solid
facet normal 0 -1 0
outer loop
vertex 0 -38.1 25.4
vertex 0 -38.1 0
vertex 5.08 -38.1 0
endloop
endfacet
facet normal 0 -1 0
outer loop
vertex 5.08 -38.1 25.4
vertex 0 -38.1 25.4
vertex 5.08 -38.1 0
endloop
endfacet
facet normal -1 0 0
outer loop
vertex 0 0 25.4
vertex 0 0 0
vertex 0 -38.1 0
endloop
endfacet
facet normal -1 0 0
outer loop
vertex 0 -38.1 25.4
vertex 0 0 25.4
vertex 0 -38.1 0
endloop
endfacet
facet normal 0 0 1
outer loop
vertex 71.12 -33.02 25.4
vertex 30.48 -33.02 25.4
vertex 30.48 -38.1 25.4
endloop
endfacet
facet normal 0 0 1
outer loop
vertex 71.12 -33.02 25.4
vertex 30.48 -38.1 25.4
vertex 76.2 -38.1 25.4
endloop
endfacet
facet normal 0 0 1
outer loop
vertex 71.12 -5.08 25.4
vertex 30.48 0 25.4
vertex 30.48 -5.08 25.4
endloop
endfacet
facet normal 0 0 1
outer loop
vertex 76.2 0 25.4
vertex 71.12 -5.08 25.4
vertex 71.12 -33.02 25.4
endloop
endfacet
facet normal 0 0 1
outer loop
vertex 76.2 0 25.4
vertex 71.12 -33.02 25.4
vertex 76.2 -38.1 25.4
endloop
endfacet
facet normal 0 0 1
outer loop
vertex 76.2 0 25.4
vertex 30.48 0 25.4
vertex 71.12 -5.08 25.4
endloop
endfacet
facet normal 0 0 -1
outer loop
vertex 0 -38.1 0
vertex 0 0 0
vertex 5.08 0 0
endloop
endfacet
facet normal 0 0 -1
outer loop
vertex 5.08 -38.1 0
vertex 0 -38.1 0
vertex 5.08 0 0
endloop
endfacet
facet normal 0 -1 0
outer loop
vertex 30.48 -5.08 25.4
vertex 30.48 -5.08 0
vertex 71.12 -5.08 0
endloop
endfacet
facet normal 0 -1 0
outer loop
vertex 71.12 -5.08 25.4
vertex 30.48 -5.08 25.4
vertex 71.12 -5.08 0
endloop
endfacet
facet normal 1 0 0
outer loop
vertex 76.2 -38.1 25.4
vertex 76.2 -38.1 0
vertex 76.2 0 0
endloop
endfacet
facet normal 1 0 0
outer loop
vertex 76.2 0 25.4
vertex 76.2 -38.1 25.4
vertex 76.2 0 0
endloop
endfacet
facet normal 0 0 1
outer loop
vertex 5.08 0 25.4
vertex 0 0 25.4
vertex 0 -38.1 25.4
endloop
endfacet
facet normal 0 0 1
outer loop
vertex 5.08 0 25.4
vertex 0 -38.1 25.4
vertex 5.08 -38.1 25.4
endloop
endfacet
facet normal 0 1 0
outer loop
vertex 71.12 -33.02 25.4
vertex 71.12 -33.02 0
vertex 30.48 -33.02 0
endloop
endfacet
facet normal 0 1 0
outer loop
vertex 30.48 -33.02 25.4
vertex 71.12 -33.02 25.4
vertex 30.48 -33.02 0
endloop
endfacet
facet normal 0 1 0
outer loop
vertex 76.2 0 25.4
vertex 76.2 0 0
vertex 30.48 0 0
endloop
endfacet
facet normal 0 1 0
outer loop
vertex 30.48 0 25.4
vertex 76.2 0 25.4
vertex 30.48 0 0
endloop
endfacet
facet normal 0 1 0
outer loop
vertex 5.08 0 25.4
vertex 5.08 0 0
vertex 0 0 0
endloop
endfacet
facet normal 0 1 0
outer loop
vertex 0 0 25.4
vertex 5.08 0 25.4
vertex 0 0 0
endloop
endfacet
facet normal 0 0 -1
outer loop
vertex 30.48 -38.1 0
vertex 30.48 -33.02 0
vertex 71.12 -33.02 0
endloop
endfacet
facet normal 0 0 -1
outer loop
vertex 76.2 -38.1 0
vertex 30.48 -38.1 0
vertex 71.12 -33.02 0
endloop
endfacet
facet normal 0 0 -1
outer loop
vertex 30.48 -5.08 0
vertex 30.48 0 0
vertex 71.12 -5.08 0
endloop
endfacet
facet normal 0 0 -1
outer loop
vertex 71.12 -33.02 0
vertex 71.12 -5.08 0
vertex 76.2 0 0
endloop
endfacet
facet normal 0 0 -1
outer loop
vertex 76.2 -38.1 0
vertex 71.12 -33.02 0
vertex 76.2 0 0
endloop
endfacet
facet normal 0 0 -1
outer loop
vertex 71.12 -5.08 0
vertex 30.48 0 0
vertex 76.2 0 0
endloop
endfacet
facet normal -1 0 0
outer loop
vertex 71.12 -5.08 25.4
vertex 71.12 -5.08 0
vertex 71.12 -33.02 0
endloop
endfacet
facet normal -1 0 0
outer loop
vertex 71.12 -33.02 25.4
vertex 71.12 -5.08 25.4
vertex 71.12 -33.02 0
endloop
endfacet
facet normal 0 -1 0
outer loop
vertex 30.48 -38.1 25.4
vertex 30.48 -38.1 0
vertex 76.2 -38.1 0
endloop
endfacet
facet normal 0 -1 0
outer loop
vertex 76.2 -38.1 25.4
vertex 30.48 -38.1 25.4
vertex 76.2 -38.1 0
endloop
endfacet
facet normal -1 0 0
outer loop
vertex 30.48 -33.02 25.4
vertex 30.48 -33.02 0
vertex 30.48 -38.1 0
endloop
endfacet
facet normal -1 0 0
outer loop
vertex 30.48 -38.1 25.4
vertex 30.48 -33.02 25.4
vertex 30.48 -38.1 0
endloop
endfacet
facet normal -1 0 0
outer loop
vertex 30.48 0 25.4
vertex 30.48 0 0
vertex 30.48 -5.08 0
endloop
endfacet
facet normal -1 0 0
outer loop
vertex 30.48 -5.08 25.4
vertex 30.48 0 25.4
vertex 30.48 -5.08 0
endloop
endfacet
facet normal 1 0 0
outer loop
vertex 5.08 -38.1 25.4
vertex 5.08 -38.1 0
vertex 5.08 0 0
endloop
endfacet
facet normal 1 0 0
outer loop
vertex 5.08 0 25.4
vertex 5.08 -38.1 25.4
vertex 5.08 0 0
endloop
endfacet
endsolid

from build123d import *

# Parameters (mm, degrees)
F1_DEPTH = 25.4


with BuildPart() as f1:
    # F0 (on Top) → F1 (new body)
    with BuildSketch(Plane.XY):
        Polygon((5.08, 0), (0, 0), (0, -38.1), (5.08, -38.1), (5.08, -33.02), (5.08, -5.08), align=None)
        Polygon((76.2, 0), (30.48, 0), (30.48, -5.08), (71.12, -5.08), (71.12, -33.02), (30.48, -33.02), (30.48, -38.1), (76.2, -38.1), align=None)
    extrude(amount=F1_DEPTH)


solid = f1.part
